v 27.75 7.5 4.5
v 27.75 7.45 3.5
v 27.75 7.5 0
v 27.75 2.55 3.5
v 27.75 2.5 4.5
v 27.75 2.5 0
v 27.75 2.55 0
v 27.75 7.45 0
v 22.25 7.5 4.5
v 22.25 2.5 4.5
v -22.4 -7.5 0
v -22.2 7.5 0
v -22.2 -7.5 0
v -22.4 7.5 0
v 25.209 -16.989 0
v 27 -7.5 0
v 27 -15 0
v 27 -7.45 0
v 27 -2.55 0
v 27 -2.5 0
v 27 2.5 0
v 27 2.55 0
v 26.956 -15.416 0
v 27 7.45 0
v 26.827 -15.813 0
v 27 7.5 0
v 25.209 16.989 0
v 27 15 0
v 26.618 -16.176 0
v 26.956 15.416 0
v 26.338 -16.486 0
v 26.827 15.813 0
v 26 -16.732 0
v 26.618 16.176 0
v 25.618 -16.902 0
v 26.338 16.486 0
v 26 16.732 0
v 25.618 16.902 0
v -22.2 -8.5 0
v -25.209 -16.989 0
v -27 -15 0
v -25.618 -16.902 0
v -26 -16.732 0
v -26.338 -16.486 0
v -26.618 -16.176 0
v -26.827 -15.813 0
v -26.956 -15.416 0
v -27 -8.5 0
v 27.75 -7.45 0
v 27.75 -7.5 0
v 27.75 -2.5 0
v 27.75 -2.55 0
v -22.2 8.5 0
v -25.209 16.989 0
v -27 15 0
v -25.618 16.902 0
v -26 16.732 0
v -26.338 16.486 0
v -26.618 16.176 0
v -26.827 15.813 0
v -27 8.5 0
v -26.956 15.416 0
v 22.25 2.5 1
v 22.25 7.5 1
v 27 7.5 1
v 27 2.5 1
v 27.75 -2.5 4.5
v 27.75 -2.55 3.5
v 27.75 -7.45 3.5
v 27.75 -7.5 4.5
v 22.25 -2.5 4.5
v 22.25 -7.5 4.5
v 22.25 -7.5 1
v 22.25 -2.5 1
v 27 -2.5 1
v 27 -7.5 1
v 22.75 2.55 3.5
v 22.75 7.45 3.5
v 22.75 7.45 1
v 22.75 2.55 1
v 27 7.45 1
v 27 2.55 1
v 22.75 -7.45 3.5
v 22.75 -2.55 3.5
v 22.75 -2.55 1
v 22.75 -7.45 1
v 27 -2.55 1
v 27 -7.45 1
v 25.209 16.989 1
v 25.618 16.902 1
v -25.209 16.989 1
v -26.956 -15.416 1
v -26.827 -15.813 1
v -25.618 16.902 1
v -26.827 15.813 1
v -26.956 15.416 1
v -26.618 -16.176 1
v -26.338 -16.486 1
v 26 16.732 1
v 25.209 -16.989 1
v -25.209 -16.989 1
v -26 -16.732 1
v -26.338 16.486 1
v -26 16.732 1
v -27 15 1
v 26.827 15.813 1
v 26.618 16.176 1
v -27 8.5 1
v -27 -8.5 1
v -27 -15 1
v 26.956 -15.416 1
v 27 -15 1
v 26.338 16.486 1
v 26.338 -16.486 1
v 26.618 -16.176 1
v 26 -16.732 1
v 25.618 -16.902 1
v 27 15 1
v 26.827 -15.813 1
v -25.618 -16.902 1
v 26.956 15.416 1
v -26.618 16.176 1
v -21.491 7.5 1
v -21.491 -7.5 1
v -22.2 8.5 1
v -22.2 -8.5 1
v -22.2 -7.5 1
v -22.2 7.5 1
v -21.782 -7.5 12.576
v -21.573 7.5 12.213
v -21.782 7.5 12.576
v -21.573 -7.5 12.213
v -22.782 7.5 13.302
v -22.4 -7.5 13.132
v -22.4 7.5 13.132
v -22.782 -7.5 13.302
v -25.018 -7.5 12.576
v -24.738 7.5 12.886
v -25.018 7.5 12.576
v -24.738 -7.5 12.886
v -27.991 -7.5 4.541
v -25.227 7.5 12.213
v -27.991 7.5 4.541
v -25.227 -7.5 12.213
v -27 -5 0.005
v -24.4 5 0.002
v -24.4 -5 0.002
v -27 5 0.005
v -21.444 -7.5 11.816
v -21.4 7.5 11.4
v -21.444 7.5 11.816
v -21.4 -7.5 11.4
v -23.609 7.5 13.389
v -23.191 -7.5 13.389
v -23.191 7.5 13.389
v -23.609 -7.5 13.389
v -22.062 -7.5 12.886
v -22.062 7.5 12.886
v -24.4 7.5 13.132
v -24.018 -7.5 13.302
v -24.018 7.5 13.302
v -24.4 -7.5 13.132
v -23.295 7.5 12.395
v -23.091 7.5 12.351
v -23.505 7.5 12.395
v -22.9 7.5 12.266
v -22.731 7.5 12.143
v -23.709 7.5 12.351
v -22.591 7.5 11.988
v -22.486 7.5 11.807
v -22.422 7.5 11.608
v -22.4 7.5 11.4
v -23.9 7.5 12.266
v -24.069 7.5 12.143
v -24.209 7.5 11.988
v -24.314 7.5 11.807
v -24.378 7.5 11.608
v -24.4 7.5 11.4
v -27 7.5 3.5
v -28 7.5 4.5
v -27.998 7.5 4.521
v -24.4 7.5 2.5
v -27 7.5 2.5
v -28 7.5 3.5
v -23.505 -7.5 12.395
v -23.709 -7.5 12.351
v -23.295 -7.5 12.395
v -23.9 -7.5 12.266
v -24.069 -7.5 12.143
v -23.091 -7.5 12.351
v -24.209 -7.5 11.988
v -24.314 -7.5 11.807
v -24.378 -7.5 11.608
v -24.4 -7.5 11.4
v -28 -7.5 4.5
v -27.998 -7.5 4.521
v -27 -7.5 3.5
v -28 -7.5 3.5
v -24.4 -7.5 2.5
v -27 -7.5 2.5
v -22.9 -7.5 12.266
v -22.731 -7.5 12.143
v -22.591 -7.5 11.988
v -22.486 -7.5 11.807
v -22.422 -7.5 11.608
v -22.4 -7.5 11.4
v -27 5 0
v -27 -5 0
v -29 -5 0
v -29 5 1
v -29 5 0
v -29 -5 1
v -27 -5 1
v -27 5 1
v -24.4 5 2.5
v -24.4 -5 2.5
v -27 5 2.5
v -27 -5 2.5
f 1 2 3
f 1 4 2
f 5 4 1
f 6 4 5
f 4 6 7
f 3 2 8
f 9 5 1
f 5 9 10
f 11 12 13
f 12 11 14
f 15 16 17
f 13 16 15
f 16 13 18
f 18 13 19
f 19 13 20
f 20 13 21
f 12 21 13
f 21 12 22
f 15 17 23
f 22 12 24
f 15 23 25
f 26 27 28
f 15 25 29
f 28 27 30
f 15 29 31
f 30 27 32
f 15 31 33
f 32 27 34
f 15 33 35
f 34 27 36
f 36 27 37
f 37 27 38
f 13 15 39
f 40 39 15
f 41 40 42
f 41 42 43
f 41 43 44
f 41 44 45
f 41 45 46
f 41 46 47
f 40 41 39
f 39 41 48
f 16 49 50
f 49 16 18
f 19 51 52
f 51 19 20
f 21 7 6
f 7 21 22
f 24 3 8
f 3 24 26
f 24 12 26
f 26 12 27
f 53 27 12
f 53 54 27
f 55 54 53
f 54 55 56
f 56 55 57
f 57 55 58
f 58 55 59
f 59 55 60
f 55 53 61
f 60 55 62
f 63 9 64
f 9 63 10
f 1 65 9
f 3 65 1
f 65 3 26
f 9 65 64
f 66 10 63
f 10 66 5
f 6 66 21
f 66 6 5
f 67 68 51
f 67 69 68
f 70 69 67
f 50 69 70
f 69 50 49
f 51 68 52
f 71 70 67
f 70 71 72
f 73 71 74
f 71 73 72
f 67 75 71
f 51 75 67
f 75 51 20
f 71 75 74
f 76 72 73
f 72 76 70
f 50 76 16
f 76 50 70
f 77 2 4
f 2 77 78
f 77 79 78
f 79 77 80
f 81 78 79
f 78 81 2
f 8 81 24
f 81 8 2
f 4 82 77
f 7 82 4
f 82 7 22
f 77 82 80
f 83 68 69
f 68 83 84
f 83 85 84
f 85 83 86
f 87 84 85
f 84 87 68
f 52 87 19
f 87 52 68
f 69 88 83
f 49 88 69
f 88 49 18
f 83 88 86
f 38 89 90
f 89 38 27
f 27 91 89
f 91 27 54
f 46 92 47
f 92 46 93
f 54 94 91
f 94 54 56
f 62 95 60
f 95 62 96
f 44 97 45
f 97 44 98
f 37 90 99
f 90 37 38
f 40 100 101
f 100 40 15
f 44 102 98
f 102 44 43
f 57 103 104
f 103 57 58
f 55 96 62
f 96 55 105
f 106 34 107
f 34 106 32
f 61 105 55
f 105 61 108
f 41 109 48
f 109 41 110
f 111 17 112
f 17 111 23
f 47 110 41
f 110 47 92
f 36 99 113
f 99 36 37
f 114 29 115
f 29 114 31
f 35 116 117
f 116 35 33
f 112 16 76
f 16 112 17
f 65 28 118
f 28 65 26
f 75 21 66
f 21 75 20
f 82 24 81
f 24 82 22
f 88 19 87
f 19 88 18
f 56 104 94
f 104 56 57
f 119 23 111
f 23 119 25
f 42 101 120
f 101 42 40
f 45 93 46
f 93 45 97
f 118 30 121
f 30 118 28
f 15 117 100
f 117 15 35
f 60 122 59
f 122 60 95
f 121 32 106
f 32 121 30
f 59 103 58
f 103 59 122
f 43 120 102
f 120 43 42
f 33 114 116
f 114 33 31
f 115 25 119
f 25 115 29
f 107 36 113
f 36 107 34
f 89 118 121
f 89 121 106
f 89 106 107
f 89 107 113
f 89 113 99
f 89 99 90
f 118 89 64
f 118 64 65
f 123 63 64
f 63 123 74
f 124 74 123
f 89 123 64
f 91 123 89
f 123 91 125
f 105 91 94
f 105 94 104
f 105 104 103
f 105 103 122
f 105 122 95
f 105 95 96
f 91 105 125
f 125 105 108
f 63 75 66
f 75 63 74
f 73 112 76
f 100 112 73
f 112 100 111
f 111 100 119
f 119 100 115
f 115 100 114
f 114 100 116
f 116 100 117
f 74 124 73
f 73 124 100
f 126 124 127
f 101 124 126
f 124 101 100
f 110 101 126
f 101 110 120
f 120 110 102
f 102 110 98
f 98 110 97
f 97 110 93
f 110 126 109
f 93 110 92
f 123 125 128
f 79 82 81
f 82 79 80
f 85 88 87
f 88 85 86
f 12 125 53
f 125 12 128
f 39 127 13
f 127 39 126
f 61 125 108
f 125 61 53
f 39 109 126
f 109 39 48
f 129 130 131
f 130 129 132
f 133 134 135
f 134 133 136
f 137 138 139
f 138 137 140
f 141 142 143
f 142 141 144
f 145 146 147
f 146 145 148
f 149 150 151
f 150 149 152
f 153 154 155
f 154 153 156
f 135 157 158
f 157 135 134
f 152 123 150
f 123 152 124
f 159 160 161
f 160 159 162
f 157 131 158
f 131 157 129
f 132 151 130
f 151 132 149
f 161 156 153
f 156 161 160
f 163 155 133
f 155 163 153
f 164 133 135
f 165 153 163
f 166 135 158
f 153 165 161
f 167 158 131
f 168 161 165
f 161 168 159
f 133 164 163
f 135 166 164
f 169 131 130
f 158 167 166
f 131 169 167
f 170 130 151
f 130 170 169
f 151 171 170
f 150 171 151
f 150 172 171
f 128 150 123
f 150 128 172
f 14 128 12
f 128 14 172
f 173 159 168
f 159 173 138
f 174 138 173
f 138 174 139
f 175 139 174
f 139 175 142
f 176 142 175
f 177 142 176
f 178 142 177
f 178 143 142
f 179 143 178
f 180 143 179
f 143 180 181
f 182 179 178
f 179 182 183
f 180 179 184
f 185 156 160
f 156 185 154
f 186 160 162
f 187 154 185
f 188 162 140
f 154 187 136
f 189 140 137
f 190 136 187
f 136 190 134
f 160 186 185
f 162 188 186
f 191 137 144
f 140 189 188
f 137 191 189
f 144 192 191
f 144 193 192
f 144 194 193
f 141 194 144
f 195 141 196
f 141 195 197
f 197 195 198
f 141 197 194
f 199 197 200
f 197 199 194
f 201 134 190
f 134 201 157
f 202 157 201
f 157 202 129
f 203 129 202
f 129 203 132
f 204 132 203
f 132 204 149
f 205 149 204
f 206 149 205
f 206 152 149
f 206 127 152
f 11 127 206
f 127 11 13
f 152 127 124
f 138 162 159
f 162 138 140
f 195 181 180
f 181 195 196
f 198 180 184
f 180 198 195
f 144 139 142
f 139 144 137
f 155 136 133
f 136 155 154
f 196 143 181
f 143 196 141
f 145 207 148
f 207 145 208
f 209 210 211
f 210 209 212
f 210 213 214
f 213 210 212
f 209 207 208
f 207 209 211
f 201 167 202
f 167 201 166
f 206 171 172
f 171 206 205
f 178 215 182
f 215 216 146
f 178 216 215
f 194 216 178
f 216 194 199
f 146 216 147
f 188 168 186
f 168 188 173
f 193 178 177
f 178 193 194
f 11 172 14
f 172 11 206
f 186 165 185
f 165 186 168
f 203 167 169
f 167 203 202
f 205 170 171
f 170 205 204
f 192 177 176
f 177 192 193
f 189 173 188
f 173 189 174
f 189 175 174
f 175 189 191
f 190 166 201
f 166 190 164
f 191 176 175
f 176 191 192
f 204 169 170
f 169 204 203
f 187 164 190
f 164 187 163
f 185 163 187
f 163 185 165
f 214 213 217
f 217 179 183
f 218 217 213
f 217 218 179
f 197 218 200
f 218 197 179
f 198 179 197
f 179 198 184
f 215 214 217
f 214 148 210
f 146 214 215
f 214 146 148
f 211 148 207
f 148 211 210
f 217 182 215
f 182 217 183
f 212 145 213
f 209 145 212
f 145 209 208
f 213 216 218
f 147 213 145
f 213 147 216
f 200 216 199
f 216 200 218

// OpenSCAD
// [FL_INDEX: keywords="openscad, 3d_parametric, Battery_Cover_Creator__Customizable, csg_solid" | COT="Parametric OpenSCAD design from 3DCodeverse"]
// Title: Battery Cover Creator (Customizable)

// ===== file: battery_cover_creator_1.0.scad =====
// This generates custom battery covers
// Licenced under Creative Commons: Attribution, Share-Alike
//		http://creativecommons.org/licenses/by-sa/3.0/
// For attribution you can direct people to the original file on thingiverse:
// 		http://www.thingiverse.com/thing:243269

// ================ variables

//CUSTOMIZER VARIABLES

/* [Basic] */

// how long the battery cover is.  (This dimension is in the clip-to-ears direction.)
length=50; // 10:200

// how wide the battery cover is
width=30; // 10:200

// how thick the battery cover is
thickness=0.5;  // 0.1:10

// radius for rounding over the corners of the battery cover
corner_radius=2;  // 0:10

// how thick the case plastic is
case_thickness=3.5;

/* [Ears] */

// how wide the ear tabs are
ear_width=5;  // 2:25

// how wide the ear tabs are
ear_length=5;  // 2:25

// how far apart the ear tabs are.  (To create one wide tab, just set this to 0.)
ear_spacing=10;  // 1:100

// How thick the case is where the ears attach.  Usually it should be the same as "thickness" on the "basic" tab
ear_case_thickness=3.5;  // 0.1:10

/* [Clip] */

// How wide the clip is
clip_width=15; // 5:50

// How deep the clip is
clip_length=5.8; // 5.8

// This is used for a side-engagement clip.  Most clips are this way now.  It measures how wide the small part of the clip is.
clip_width_sides=10;

// This is for a front-engagement clip.  If unused, set it to 0, otherwise, how long the catch will be (usually about 2-3mm)
clip_length_catch=1;

// How far the clip is in/out relative to the edge of the battery cover.
//clip_indent=0;  // -15:15

// This is how far down into the battery case the clip engages.  Usually it should be the same as "thickness" on the "basic" tab
clip_case_thickness=3.5;  // 0.1:10

// The thickness of the finger tab
tab_thickness=1;

/* [Gussets] */

// Which direction the support gussets go
gusset_orientation=0; // [0:clip_lengthwise,1:clip_widthwise]

// How thick the gussets are (set to 0 to turn off gussets)
gusset_thickness=0;

// How high the gussets are
gusset_height=0;

// How far apart the gussets are
gusset_spacing=0;

/* [Advanced] */

// Resolution
$fn=30;

// end variables

cover(width,length,thickness,case_thickness,gusset_thickness,corner_radius,ear_width,ear_spacing,clip_width,clip_width_sides,clip_length,clip_length_catch,clip_case_thickness,ear_length,tab_thickness);

module clip(clip_width=15,clip_width_sides=10,clip_length=1,clip_case_thickness=5,clip_length_catch=3,tab_thickness=3) {
	rotate([90,0,0]){
		difference () {
			union(){ // the outside shape
				hull () {
					translate([0,0,0]) cylinder(r=1,h=clip_width); // outside radius
					translate([5,0,0]) cylinder(r=1,h=clip_width); // inside fadius
					translate([3.6,10.4,0]) cylinder(r=2,h=clip_width); // top
					if(clip_length_catch>0){
						translate([-clip_length_catch+0.1,clip_case_thickness,0]) cylinder(r=0.1,h=clip_width); // add a front overhang
					}
				}
				translate([-2,-1,0]) cube([2,tab_thickness,clip_width]); // the overlap tab
			}
			union(){ // The inside void
				hull() { 
					translate([3.6,10.4,0]) cylinder(r=1,h=clip_width);
					translate([3.5,-2,0]) cylinder(r=1,h=clip_width);
					translate([2.9,-2,0]) cylinder(r=1,h=clip_width);
				}
				//translate([-tab_thickness,0,0]) cube([3,clip_case_thickness,clip_width]); // trim off outside
				translate([-2,-2,0]) cube([5,clip_case_thickness,(clip_width-clip_width_sides)/2]); // trim off left side
				translate([-2,-2,clip_width-(clip_width-clip_width_sides)/2]) cube([5,clip_case_thickness,(clip_width-clip_width_sides)/2]); // trim off right side
			}
		}
	}
}

module cover(width=30,length=60,thickness=0.5,case_thickness=3.9,gusset_thickness=4.5,corner_radius=1,ear_width=7.5,ear_spacing=29,clip_width=15,clip_width_sides=10,clip_length=1,clip_length_catch=3,clip_case_thickness=5,ear_length=5.8,tab_thickness=3) {
	difference(){
		// the base shape
		union(){
			// the face
			translate([-length/2,-width/2,0]) 
			minkowski(){
				cube([length,width,thickness]);
				if(corner_radius>0) cylinder(r=corner_radius,h=thickness);
			}
			// gussets
			translate([8.1,0,0]) cube([54.8,1.6,gusset_thickness]);
			translate([8.1,64.4,0]) cube([54.8,1.6,gusset_thickness]);
			// the ears
			translate([(length-ear_length-thickness)/2,(ear_spacing/2)-(ear_width/2),thickness*2]) cube([ear_length+thickness,ear_width,case_thickness+thickness]);
			translate([(length-ear_length-thickness)/2,(-ear_spacing/2)+(-ear_width/2),thickness*2]) cube([ear_length+thickness,ear_width,case_thickness+thickness]);
		}
		union(){
			translate([(-length/2)-corner_radius,-clip_width/2-1,0]) cube([clip_length,clip_width+2,thickness*2]); // the hole for the clip
			translate([(length-ear_length)/2+thickness,-width/2,thickness*2]) cube([30,width,case_thickness-thickness]); // ear notch 
		}
	}
	// the clip itsself
	translate([(-length/2)-corner_radius,clip_width/2,1]) clip(clip_width,clip_width_sides,clip_length,clip_case_thickness,clip_length_catch,tab_thickness);
}

// ===== file: battery_cover_creator_2.0.scad =====
// This thing generates custom battery covers
//
// v2.0
//
// Licenced under Creative Commons: Attribution, Share-Alike
//		http://creativecommons.org/licenses/by-sa/3.0/
// For attribution you can direct people to the original file on thingiverse:
// 		http://www.thingiverse.com/thing:243269

// ================ variables

//CUSTOMIZER VARIABLES

/* [Basic] */

// how long the battery cover is.  (This dimension is in the clip-to-ears direction.)
length=50; // 10:200

// how wide the battery cover is
width=30; // 10:200

// how thick the battery cover is
thickness=0.5;  // 0.1:10

// radius for rounding over the corners of the battery cover
corner_radius=2;  // 0:10

// how thick the case plastic is
case_thickness=3.5;

// for generating support material.  Can be 0.
support_thickness=0.05;

/* [Ears] */

// how wide the ear tabs are
ear_width=5;  // 2:25

// how wide the ear tabs are
ear_length=5;  // 2:25

// how far apart the ear tabs are.  (To create one wide tab, just set this to 0.)
ear_spacing=10;  // 1:100

// How thick the case is where the ears attach.  Usually it should be the same as "thickness" on the "basic" tab
ear_case_thickness=3.5;  // 0.1:10

/* [Clip] */

// How wide the clip is
clip_width=15; // 5:50

// How deep the clip is (overhang)
clip_depth=1;

// How long the clip is
clip_length=5.8; // 5.8

// This is used for a side-engagement clip.  Most clips are this way now.  It measures how wide the small part of the clip is.
clip_width_sides=10;

// This is for a front-engagement clip.  If unused, set it to 0, otherwise, how long the catch will be (usually about 2-3mm)
clip_length_catch=1;

// How far the clip is in/out relative to the edge of the battery cover.
//clip_indent=0;  // -15:15

// This is how far down into the battery case the clip engages.  Usually it should be the same as "thickness" on the "basic" tab
clip_case_thickness=3.5;  // 0.1:10

// The thickness of the finger tab
tab_thickness=1;

/* [Gussets] */

// Which direction the support gussets go
gusset_orientation=0; // [0:clip_lengthwise,1:clip_widthwise]

// How thick the gussets are (set to 0 to turn off gussets)
gusset_thickness=0;

// How high the gussets are
gusset_height=0;

// How far apart the gussets are
gusset_spacing=0;

/* [Advanced] */

// Resolution
$fn=30;

/* [hidden] */

scoche=0.01;
halfscoche=scoche/2;

cover(width,length,thickness,case_thickness,gusset_thickness,corner_radius,ear_width,ear_spacing,clip_width,clip_width_sides,clip_length,clip_length_catch,clip_case_thickness,ear_length,tab_thickness);

module clip(clip_width=15,clip_width_sides=10,clip_length=1,clip_case_thickness=5,clip_length_catch=3,tab_thickness=3) {
	top_r=2;
	top_r_x=3.6;
	top_r_y=10.4;
	inside_corner_x=5;
	overlap_tab_w=2;
	inside_void_d1=2;
	inside_void_d2=2;
	inside_void_x=3.6;
	
	rotate([90,0,0]){
		difference () {
			union(){ // the outside shape
				hull () {
					translate([0,0,0]) cylinder(r=1,h=clip_width); // outside radius
					translate([inside_corner_x-1/2,-1,0]) cube([1,1,clip_width]); // inside corner
					translate([top_r_x,top_r_y,0]) cylinder(r=top_r,h=clip_width); // top
					if(clip_length_catch>0){
						translate([-clip_length_catch+0.1,clip_case_thickness,0]) cylinder(r=0.1,h=clip_width); // add a front overhang
					}
				}
				translate([-overlap_tab_w,-1,0]) cube([overlap_tab_w,tab_thickness,clip_width]); // the overlap tab
			}
			union(){ 
				translate([inside_void_x,0,0]) hull() { // The inside void
					translate([0,10.4,-clip_width/2]) cylinder(r=inside_void_d1/2,h=clip_width*2);
					translate([-inside_void_d2/2,-tab_thickness-scoche,-clip_width/2]) cube([inside_void_d2,scoche,clip_width*2]);
				}
				// trim the tab overhang
				translate([-tab_thickness-clip_depth,0,-clip_width/2]) cube([clip_depth*2,clip_case_thickness-tab_thickness,clip_width*2]); // trim off outside
				// trim the tab width
				translate([-2-halfscoche,-2,-(clip_width-clip_width_sides)/2]) cube([5+scoche,clip_case_thickness,(clip_width-clip_width_sides)]); // trim off left side
				translate([-2-halfscoche,-2,clip_width-(clip_width-clip_width_sides)/2]) cube([5+scoche,clip_case_thickness,(clip_width-clip_width_sides)]); // trim off right side
			}
		}
	}
}

module cover(width=30,length=60,thickness=0.5,case_thickness=3.9,gusset_thickness=4.5,corner_radius=1,ear_width=7.5,ear_spacing=29,clip_width=15,clip_width_sides=10,clip_length=1,clip_length_catch=3,clip_case_thickness=5,ear_length=5.8,tab_thickness=3) {
	clip_thickness=1;
	difference(){
		// the base shape
		union(){
			// the face
			translate([-length/2,-width/2,0]) 
			minkowski(){
				cube([length,width,thickness]);
				if(corner_radius>0) cylinder(r=corner_radius,h=thickness);
			}
			// gussets
			translate([8.1,0,0]) cube([54.8,1.6,gusset_thickness]);
			translate([8.1,64.4,0]) cube([54.8,1.6,gusset_thickness]);
			
			difference(){// the ears
				union(){
					translate([(length-ear_length-thickness)/2,(ear_spacing/2)-(ear_width/2),0]) cube([ear_length+thickness,ear_width,case_thickness+thickness*2]);
					translate([(length-ear_length-thickness)/2,(-ear_spacing/2)+(-ear_width/2),0]) cube([ear_length+thickness,ear_width,case_thickness+thickness*2]);
				}	
				translate([(length-ear_length+thickness)/2,(ear_spacing/2)-(ear_width/2)+support_thickness,0]) cube([ear_length,ear_width-support_thickness*2,case_thickness]);
				translate([(length-ear_length+thickness)/2,(-ear_spacing/2)+(-ear_width/2)+support_thickness,0]) cube([ear_length,ear_width-support_thickness*2,case_thickness]);
			}
		}
		union(){
			// hole for clip
			translate([(-length/2)-corner_radius,-clip_width/2-1,-scoche]) cube([clip_length-clip_thickness,clip_width+2,thickness*2+scoche]); // the hole for the clip
			// cutout for ears
		}
	}
	// the clip itsself
	translate([(-length/2)-corner_radius,clip_width/2,1]) clip(clip_width,clip_width_sides,clip_length,clip_case_thickness,clip_length_catch,tab_thickness);
}
